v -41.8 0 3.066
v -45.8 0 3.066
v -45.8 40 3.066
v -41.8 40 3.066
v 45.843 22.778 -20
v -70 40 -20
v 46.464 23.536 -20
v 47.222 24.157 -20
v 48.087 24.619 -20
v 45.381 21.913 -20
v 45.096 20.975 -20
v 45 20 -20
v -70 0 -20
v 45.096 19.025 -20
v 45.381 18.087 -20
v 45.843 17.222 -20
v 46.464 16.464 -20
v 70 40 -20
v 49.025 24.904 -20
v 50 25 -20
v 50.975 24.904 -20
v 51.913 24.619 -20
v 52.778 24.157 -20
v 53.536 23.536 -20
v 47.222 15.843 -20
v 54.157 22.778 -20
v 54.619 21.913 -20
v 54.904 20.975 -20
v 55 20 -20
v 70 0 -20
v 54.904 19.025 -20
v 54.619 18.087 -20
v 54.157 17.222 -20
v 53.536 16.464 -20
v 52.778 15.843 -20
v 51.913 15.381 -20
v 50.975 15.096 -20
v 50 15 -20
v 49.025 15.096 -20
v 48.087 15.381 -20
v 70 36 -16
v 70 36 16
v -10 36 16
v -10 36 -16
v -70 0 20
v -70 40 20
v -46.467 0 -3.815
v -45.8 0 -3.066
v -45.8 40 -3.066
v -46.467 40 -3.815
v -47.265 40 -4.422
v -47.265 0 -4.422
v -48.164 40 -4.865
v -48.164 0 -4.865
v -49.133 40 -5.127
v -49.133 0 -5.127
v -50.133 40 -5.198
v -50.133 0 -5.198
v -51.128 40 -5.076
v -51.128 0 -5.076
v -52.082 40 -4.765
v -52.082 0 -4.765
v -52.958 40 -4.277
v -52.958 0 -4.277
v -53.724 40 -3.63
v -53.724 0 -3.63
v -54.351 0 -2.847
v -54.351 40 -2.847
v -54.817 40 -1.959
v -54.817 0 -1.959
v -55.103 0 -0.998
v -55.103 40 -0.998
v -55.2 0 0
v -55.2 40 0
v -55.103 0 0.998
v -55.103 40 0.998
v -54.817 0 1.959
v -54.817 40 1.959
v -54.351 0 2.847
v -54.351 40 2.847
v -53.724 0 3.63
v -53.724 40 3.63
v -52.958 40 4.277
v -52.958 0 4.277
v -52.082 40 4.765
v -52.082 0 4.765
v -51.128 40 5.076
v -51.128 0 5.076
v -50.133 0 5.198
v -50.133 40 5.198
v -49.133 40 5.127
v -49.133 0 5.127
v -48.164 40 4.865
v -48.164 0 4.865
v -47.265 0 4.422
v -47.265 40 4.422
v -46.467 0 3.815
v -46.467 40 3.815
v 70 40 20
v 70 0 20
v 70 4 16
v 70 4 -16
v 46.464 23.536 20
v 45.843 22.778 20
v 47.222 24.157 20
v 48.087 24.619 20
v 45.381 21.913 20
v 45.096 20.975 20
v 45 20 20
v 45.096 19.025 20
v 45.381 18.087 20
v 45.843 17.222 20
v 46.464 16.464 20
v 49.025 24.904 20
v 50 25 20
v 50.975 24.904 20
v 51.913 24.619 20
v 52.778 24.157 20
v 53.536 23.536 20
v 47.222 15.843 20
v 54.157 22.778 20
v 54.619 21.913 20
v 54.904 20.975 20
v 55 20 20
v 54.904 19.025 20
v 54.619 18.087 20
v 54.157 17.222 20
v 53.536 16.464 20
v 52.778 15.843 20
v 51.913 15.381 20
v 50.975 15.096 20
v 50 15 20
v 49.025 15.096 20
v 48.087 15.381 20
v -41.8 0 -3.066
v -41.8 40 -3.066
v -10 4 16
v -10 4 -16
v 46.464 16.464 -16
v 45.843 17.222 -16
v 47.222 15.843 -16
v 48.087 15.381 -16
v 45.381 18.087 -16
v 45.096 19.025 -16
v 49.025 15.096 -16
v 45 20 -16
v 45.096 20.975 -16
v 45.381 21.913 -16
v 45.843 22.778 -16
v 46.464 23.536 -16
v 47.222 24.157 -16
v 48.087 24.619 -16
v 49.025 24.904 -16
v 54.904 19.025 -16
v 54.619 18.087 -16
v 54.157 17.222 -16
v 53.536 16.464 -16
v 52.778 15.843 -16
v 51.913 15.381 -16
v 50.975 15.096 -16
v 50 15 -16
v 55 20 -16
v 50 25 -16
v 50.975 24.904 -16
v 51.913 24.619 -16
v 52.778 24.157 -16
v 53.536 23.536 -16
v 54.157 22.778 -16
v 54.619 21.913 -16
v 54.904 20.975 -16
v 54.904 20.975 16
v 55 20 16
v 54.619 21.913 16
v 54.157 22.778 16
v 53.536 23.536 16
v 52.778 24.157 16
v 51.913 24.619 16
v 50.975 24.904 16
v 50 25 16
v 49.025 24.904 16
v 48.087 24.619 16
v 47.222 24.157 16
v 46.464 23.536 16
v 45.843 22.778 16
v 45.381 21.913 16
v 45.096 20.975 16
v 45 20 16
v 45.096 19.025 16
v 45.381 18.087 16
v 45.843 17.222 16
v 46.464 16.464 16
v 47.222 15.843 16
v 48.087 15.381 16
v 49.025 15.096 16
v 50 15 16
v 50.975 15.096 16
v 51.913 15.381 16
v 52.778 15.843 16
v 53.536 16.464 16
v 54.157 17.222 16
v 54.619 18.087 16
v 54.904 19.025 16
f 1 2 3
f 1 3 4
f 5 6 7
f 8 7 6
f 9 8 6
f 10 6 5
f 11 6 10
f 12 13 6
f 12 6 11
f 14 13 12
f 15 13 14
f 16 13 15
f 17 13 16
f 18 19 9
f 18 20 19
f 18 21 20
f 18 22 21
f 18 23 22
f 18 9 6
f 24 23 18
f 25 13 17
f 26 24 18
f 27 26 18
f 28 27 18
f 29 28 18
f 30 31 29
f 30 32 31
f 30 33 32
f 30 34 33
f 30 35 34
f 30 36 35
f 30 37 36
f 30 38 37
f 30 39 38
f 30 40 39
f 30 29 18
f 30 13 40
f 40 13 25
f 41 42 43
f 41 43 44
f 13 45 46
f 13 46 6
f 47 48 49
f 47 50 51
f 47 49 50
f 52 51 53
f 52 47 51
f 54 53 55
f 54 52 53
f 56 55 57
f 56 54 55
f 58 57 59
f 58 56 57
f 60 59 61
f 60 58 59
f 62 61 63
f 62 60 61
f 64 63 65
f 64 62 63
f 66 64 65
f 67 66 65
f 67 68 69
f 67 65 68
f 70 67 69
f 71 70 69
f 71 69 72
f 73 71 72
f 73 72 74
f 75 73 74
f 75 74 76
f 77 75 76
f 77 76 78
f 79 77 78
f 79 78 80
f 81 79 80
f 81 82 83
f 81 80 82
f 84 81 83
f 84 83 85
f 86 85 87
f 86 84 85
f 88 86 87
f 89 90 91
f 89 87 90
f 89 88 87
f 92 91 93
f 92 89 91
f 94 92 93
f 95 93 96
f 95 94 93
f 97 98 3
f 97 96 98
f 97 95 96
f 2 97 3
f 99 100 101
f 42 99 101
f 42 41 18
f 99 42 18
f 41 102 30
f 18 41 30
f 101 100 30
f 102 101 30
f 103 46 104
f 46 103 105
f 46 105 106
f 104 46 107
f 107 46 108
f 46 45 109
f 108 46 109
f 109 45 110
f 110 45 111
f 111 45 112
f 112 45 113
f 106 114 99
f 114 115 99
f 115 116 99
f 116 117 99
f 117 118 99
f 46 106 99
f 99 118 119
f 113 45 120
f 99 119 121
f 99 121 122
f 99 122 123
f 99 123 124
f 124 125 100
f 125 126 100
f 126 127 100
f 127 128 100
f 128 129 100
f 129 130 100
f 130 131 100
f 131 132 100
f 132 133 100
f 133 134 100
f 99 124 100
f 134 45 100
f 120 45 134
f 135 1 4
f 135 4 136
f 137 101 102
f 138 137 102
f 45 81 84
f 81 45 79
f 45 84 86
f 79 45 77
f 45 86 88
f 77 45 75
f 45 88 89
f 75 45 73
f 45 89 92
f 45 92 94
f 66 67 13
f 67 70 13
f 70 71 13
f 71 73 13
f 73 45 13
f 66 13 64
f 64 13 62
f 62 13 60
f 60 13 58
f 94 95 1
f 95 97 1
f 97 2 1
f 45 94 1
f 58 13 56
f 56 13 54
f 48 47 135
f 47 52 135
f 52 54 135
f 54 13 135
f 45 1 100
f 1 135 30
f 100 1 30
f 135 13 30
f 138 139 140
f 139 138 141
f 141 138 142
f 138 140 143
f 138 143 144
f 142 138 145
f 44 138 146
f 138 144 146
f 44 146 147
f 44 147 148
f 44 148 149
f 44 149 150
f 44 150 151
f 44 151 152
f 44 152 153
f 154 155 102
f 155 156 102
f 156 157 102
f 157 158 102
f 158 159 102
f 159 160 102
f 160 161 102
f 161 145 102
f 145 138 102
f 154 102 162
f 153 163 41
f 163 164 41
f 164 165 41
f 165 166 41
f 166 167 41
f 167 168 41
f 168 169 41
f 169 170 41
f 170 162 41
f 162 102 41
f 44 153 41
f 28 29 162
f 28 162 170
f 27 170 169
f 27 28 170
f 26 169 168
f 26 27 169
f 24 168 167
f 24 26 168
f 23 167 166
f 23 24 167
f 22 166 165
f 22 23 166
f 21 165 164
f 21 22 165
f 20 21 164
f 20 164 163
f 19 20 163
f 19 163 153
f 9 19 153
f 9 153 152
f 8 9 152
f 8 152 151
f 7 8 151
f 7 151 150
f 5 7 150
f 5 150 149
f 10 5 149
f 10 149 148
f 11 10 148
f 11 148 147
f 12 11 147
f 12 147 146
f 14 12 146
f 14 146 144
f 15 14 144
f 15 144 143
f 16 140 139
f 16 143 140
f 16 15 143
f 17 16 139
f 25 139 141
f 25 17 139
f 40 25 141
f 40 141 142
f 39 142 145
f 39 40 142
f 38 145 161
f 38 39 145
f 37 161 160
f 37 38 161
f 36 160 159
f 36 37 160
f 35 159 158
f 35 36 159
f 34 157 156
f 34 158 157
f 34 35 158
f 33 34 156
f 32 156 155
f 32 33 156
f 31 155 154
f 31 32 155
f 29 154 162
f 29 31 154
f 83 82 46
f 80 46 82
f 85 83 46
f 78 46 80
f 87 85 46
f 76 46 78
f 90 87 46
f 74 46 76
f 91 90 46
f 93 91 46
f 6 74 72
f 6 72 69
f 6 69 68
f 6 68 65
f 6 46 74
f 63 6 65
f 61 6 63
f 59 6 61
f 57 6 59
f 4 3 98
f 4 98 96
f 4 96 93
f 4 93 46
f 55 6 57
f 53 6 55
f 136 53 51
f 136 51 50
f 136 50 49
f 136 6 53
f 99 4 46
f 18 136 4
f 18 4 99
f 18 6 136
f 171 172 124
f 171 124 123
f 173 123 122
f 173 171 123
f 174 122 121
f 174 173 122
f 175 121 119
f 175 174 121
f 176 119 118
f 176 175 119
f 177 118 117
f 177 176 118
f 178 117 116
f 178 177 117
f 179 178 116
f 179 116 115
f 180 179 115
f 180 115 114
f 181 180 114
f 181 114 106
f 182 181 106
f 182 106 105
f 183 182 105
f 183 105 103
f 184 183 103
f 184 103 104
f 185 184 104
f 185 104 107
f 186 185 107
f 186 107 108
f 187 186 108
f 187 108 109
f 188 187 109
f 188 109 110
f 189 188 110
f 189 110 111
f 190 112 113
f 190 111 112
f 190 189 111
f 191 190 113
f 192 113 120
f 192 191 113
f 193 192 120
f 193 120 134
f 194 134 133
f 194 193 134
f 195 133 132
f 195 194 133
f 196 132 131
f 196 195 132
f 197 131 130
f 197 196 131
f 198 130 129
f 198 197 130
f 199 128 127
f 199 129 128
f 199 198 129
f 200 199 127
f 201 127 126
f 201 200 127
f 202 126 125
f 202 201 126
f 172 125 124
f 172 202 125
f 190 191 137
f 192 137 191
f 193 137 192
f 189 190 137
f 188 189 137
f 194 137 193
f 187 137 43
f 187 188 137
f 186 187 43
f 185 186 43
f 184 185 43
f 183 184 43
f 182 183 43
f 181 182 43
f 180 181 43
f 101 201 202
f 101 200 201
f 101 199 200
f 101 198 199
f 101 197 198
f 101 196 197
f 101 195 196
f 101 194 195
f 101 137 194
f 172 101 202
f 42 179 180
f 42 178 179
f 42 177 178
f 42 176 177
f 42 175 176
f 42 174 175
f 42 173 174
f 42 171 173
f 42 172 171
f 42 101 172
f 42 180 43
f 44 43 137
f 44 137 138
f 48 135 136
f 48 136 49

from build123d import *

# Parameters (mm, degrees)
SKETCH2_W               = 140
SKETCH2_H               = 40
SKETCH2_R               = 5.2
BOSS_EXTRUDE1_DEPTH     = 40
CUT_EXTRUDE1_DEPTH      = 84.066238629
CUT_EXTRUDE1_DEPTH_BACK = 84.066238629
SKETCH3_R               = 5
CUT_EXTRUDE5_DEPTH      = 84.066238629
CUT_EXTRUDE5_DEPTH_BACK = 84.066238629
SKETCH7_W               = 2
SKETCH7_H               = 6.131883886
CUT_EXTRUDE6_START      = 70
SKETCH8_W               = 32
SKETCH8_H               = 32
CUT_EXTRUDE6_DEPTH      = 80


with BuildPart() as part:
    # Sketch2 → Boss-Extrude1 (new body)
    with BuildSketch(Plane(origin=(0, 0, 0), x_dir=(1, 0, 0), z_dir=(0, 1, 0))):
        Rectangle(SKETCH2_W, SKETCH2_H)
        with Locations(Location((-50, 0, 0), (0, 0, 270))):
            Circle(SKETCH2_R, mode=Mode.SUBTRACT)
    extrude(amount=BOSS_EXTRUDE1_DEPTH)

    # Sketch3 → Cut-Extrude1 (cut, two sides: drawn at the far end of the back side and taken through both)
    with BuildSketch(Plane.XY.offset(-CUT_EXTRUDE1_DEPTH_BACK)):
        with Locations((50, 20)):
            Circle(SKETCH3_R)
    extrude(amount=CUT_EXTRUDE1_DEPTH + CUT_EXTRUDE1_DEPTH_BACK, mode=Mode.SUBTRACT)

    # Sketch7 → Cut-Extrude5 (cut, two sides: drawn at the far end of the back side and taken through both)
    with BuildSketch(Plane(origin=(0, 0, 0), x_dir=(1, 0, 0), z_dir=(0, 1, 0)).offset(-CUT_EXTRUDE5_DEPTH_BACK)):
        with Locations((-42.8, 0)):
            Rectangle(SKETCH7_W, SKETCH7_H)
        with Locations((-44.8, 0)):
            Rectangle(SKETCH7_W, SKETCH7_H)
    extrude(amount=CUT_EXTRUDE5_DEPTH + CUT_EXTRUDE5_DEPTH_BACK, mode=Mode.SUBTRACT)

    # Sketch8 → Cut-Extrude6 (cut)
    with BuildSketch(Plane(origin=(0, 0, 0), x_dir=(0, 0, -1), z_dir=(1, 0, 0)).offset(CUT_EXTRUDE6_START)):
        with Locations((0, 20)):
            Rectangle(SKETCH8_W, SKETCH8_H)
    extrude(amount=-CUT_EXTRUDE6_DEPTH, mode=Mode.SUBTRACT)


solid = part.part
